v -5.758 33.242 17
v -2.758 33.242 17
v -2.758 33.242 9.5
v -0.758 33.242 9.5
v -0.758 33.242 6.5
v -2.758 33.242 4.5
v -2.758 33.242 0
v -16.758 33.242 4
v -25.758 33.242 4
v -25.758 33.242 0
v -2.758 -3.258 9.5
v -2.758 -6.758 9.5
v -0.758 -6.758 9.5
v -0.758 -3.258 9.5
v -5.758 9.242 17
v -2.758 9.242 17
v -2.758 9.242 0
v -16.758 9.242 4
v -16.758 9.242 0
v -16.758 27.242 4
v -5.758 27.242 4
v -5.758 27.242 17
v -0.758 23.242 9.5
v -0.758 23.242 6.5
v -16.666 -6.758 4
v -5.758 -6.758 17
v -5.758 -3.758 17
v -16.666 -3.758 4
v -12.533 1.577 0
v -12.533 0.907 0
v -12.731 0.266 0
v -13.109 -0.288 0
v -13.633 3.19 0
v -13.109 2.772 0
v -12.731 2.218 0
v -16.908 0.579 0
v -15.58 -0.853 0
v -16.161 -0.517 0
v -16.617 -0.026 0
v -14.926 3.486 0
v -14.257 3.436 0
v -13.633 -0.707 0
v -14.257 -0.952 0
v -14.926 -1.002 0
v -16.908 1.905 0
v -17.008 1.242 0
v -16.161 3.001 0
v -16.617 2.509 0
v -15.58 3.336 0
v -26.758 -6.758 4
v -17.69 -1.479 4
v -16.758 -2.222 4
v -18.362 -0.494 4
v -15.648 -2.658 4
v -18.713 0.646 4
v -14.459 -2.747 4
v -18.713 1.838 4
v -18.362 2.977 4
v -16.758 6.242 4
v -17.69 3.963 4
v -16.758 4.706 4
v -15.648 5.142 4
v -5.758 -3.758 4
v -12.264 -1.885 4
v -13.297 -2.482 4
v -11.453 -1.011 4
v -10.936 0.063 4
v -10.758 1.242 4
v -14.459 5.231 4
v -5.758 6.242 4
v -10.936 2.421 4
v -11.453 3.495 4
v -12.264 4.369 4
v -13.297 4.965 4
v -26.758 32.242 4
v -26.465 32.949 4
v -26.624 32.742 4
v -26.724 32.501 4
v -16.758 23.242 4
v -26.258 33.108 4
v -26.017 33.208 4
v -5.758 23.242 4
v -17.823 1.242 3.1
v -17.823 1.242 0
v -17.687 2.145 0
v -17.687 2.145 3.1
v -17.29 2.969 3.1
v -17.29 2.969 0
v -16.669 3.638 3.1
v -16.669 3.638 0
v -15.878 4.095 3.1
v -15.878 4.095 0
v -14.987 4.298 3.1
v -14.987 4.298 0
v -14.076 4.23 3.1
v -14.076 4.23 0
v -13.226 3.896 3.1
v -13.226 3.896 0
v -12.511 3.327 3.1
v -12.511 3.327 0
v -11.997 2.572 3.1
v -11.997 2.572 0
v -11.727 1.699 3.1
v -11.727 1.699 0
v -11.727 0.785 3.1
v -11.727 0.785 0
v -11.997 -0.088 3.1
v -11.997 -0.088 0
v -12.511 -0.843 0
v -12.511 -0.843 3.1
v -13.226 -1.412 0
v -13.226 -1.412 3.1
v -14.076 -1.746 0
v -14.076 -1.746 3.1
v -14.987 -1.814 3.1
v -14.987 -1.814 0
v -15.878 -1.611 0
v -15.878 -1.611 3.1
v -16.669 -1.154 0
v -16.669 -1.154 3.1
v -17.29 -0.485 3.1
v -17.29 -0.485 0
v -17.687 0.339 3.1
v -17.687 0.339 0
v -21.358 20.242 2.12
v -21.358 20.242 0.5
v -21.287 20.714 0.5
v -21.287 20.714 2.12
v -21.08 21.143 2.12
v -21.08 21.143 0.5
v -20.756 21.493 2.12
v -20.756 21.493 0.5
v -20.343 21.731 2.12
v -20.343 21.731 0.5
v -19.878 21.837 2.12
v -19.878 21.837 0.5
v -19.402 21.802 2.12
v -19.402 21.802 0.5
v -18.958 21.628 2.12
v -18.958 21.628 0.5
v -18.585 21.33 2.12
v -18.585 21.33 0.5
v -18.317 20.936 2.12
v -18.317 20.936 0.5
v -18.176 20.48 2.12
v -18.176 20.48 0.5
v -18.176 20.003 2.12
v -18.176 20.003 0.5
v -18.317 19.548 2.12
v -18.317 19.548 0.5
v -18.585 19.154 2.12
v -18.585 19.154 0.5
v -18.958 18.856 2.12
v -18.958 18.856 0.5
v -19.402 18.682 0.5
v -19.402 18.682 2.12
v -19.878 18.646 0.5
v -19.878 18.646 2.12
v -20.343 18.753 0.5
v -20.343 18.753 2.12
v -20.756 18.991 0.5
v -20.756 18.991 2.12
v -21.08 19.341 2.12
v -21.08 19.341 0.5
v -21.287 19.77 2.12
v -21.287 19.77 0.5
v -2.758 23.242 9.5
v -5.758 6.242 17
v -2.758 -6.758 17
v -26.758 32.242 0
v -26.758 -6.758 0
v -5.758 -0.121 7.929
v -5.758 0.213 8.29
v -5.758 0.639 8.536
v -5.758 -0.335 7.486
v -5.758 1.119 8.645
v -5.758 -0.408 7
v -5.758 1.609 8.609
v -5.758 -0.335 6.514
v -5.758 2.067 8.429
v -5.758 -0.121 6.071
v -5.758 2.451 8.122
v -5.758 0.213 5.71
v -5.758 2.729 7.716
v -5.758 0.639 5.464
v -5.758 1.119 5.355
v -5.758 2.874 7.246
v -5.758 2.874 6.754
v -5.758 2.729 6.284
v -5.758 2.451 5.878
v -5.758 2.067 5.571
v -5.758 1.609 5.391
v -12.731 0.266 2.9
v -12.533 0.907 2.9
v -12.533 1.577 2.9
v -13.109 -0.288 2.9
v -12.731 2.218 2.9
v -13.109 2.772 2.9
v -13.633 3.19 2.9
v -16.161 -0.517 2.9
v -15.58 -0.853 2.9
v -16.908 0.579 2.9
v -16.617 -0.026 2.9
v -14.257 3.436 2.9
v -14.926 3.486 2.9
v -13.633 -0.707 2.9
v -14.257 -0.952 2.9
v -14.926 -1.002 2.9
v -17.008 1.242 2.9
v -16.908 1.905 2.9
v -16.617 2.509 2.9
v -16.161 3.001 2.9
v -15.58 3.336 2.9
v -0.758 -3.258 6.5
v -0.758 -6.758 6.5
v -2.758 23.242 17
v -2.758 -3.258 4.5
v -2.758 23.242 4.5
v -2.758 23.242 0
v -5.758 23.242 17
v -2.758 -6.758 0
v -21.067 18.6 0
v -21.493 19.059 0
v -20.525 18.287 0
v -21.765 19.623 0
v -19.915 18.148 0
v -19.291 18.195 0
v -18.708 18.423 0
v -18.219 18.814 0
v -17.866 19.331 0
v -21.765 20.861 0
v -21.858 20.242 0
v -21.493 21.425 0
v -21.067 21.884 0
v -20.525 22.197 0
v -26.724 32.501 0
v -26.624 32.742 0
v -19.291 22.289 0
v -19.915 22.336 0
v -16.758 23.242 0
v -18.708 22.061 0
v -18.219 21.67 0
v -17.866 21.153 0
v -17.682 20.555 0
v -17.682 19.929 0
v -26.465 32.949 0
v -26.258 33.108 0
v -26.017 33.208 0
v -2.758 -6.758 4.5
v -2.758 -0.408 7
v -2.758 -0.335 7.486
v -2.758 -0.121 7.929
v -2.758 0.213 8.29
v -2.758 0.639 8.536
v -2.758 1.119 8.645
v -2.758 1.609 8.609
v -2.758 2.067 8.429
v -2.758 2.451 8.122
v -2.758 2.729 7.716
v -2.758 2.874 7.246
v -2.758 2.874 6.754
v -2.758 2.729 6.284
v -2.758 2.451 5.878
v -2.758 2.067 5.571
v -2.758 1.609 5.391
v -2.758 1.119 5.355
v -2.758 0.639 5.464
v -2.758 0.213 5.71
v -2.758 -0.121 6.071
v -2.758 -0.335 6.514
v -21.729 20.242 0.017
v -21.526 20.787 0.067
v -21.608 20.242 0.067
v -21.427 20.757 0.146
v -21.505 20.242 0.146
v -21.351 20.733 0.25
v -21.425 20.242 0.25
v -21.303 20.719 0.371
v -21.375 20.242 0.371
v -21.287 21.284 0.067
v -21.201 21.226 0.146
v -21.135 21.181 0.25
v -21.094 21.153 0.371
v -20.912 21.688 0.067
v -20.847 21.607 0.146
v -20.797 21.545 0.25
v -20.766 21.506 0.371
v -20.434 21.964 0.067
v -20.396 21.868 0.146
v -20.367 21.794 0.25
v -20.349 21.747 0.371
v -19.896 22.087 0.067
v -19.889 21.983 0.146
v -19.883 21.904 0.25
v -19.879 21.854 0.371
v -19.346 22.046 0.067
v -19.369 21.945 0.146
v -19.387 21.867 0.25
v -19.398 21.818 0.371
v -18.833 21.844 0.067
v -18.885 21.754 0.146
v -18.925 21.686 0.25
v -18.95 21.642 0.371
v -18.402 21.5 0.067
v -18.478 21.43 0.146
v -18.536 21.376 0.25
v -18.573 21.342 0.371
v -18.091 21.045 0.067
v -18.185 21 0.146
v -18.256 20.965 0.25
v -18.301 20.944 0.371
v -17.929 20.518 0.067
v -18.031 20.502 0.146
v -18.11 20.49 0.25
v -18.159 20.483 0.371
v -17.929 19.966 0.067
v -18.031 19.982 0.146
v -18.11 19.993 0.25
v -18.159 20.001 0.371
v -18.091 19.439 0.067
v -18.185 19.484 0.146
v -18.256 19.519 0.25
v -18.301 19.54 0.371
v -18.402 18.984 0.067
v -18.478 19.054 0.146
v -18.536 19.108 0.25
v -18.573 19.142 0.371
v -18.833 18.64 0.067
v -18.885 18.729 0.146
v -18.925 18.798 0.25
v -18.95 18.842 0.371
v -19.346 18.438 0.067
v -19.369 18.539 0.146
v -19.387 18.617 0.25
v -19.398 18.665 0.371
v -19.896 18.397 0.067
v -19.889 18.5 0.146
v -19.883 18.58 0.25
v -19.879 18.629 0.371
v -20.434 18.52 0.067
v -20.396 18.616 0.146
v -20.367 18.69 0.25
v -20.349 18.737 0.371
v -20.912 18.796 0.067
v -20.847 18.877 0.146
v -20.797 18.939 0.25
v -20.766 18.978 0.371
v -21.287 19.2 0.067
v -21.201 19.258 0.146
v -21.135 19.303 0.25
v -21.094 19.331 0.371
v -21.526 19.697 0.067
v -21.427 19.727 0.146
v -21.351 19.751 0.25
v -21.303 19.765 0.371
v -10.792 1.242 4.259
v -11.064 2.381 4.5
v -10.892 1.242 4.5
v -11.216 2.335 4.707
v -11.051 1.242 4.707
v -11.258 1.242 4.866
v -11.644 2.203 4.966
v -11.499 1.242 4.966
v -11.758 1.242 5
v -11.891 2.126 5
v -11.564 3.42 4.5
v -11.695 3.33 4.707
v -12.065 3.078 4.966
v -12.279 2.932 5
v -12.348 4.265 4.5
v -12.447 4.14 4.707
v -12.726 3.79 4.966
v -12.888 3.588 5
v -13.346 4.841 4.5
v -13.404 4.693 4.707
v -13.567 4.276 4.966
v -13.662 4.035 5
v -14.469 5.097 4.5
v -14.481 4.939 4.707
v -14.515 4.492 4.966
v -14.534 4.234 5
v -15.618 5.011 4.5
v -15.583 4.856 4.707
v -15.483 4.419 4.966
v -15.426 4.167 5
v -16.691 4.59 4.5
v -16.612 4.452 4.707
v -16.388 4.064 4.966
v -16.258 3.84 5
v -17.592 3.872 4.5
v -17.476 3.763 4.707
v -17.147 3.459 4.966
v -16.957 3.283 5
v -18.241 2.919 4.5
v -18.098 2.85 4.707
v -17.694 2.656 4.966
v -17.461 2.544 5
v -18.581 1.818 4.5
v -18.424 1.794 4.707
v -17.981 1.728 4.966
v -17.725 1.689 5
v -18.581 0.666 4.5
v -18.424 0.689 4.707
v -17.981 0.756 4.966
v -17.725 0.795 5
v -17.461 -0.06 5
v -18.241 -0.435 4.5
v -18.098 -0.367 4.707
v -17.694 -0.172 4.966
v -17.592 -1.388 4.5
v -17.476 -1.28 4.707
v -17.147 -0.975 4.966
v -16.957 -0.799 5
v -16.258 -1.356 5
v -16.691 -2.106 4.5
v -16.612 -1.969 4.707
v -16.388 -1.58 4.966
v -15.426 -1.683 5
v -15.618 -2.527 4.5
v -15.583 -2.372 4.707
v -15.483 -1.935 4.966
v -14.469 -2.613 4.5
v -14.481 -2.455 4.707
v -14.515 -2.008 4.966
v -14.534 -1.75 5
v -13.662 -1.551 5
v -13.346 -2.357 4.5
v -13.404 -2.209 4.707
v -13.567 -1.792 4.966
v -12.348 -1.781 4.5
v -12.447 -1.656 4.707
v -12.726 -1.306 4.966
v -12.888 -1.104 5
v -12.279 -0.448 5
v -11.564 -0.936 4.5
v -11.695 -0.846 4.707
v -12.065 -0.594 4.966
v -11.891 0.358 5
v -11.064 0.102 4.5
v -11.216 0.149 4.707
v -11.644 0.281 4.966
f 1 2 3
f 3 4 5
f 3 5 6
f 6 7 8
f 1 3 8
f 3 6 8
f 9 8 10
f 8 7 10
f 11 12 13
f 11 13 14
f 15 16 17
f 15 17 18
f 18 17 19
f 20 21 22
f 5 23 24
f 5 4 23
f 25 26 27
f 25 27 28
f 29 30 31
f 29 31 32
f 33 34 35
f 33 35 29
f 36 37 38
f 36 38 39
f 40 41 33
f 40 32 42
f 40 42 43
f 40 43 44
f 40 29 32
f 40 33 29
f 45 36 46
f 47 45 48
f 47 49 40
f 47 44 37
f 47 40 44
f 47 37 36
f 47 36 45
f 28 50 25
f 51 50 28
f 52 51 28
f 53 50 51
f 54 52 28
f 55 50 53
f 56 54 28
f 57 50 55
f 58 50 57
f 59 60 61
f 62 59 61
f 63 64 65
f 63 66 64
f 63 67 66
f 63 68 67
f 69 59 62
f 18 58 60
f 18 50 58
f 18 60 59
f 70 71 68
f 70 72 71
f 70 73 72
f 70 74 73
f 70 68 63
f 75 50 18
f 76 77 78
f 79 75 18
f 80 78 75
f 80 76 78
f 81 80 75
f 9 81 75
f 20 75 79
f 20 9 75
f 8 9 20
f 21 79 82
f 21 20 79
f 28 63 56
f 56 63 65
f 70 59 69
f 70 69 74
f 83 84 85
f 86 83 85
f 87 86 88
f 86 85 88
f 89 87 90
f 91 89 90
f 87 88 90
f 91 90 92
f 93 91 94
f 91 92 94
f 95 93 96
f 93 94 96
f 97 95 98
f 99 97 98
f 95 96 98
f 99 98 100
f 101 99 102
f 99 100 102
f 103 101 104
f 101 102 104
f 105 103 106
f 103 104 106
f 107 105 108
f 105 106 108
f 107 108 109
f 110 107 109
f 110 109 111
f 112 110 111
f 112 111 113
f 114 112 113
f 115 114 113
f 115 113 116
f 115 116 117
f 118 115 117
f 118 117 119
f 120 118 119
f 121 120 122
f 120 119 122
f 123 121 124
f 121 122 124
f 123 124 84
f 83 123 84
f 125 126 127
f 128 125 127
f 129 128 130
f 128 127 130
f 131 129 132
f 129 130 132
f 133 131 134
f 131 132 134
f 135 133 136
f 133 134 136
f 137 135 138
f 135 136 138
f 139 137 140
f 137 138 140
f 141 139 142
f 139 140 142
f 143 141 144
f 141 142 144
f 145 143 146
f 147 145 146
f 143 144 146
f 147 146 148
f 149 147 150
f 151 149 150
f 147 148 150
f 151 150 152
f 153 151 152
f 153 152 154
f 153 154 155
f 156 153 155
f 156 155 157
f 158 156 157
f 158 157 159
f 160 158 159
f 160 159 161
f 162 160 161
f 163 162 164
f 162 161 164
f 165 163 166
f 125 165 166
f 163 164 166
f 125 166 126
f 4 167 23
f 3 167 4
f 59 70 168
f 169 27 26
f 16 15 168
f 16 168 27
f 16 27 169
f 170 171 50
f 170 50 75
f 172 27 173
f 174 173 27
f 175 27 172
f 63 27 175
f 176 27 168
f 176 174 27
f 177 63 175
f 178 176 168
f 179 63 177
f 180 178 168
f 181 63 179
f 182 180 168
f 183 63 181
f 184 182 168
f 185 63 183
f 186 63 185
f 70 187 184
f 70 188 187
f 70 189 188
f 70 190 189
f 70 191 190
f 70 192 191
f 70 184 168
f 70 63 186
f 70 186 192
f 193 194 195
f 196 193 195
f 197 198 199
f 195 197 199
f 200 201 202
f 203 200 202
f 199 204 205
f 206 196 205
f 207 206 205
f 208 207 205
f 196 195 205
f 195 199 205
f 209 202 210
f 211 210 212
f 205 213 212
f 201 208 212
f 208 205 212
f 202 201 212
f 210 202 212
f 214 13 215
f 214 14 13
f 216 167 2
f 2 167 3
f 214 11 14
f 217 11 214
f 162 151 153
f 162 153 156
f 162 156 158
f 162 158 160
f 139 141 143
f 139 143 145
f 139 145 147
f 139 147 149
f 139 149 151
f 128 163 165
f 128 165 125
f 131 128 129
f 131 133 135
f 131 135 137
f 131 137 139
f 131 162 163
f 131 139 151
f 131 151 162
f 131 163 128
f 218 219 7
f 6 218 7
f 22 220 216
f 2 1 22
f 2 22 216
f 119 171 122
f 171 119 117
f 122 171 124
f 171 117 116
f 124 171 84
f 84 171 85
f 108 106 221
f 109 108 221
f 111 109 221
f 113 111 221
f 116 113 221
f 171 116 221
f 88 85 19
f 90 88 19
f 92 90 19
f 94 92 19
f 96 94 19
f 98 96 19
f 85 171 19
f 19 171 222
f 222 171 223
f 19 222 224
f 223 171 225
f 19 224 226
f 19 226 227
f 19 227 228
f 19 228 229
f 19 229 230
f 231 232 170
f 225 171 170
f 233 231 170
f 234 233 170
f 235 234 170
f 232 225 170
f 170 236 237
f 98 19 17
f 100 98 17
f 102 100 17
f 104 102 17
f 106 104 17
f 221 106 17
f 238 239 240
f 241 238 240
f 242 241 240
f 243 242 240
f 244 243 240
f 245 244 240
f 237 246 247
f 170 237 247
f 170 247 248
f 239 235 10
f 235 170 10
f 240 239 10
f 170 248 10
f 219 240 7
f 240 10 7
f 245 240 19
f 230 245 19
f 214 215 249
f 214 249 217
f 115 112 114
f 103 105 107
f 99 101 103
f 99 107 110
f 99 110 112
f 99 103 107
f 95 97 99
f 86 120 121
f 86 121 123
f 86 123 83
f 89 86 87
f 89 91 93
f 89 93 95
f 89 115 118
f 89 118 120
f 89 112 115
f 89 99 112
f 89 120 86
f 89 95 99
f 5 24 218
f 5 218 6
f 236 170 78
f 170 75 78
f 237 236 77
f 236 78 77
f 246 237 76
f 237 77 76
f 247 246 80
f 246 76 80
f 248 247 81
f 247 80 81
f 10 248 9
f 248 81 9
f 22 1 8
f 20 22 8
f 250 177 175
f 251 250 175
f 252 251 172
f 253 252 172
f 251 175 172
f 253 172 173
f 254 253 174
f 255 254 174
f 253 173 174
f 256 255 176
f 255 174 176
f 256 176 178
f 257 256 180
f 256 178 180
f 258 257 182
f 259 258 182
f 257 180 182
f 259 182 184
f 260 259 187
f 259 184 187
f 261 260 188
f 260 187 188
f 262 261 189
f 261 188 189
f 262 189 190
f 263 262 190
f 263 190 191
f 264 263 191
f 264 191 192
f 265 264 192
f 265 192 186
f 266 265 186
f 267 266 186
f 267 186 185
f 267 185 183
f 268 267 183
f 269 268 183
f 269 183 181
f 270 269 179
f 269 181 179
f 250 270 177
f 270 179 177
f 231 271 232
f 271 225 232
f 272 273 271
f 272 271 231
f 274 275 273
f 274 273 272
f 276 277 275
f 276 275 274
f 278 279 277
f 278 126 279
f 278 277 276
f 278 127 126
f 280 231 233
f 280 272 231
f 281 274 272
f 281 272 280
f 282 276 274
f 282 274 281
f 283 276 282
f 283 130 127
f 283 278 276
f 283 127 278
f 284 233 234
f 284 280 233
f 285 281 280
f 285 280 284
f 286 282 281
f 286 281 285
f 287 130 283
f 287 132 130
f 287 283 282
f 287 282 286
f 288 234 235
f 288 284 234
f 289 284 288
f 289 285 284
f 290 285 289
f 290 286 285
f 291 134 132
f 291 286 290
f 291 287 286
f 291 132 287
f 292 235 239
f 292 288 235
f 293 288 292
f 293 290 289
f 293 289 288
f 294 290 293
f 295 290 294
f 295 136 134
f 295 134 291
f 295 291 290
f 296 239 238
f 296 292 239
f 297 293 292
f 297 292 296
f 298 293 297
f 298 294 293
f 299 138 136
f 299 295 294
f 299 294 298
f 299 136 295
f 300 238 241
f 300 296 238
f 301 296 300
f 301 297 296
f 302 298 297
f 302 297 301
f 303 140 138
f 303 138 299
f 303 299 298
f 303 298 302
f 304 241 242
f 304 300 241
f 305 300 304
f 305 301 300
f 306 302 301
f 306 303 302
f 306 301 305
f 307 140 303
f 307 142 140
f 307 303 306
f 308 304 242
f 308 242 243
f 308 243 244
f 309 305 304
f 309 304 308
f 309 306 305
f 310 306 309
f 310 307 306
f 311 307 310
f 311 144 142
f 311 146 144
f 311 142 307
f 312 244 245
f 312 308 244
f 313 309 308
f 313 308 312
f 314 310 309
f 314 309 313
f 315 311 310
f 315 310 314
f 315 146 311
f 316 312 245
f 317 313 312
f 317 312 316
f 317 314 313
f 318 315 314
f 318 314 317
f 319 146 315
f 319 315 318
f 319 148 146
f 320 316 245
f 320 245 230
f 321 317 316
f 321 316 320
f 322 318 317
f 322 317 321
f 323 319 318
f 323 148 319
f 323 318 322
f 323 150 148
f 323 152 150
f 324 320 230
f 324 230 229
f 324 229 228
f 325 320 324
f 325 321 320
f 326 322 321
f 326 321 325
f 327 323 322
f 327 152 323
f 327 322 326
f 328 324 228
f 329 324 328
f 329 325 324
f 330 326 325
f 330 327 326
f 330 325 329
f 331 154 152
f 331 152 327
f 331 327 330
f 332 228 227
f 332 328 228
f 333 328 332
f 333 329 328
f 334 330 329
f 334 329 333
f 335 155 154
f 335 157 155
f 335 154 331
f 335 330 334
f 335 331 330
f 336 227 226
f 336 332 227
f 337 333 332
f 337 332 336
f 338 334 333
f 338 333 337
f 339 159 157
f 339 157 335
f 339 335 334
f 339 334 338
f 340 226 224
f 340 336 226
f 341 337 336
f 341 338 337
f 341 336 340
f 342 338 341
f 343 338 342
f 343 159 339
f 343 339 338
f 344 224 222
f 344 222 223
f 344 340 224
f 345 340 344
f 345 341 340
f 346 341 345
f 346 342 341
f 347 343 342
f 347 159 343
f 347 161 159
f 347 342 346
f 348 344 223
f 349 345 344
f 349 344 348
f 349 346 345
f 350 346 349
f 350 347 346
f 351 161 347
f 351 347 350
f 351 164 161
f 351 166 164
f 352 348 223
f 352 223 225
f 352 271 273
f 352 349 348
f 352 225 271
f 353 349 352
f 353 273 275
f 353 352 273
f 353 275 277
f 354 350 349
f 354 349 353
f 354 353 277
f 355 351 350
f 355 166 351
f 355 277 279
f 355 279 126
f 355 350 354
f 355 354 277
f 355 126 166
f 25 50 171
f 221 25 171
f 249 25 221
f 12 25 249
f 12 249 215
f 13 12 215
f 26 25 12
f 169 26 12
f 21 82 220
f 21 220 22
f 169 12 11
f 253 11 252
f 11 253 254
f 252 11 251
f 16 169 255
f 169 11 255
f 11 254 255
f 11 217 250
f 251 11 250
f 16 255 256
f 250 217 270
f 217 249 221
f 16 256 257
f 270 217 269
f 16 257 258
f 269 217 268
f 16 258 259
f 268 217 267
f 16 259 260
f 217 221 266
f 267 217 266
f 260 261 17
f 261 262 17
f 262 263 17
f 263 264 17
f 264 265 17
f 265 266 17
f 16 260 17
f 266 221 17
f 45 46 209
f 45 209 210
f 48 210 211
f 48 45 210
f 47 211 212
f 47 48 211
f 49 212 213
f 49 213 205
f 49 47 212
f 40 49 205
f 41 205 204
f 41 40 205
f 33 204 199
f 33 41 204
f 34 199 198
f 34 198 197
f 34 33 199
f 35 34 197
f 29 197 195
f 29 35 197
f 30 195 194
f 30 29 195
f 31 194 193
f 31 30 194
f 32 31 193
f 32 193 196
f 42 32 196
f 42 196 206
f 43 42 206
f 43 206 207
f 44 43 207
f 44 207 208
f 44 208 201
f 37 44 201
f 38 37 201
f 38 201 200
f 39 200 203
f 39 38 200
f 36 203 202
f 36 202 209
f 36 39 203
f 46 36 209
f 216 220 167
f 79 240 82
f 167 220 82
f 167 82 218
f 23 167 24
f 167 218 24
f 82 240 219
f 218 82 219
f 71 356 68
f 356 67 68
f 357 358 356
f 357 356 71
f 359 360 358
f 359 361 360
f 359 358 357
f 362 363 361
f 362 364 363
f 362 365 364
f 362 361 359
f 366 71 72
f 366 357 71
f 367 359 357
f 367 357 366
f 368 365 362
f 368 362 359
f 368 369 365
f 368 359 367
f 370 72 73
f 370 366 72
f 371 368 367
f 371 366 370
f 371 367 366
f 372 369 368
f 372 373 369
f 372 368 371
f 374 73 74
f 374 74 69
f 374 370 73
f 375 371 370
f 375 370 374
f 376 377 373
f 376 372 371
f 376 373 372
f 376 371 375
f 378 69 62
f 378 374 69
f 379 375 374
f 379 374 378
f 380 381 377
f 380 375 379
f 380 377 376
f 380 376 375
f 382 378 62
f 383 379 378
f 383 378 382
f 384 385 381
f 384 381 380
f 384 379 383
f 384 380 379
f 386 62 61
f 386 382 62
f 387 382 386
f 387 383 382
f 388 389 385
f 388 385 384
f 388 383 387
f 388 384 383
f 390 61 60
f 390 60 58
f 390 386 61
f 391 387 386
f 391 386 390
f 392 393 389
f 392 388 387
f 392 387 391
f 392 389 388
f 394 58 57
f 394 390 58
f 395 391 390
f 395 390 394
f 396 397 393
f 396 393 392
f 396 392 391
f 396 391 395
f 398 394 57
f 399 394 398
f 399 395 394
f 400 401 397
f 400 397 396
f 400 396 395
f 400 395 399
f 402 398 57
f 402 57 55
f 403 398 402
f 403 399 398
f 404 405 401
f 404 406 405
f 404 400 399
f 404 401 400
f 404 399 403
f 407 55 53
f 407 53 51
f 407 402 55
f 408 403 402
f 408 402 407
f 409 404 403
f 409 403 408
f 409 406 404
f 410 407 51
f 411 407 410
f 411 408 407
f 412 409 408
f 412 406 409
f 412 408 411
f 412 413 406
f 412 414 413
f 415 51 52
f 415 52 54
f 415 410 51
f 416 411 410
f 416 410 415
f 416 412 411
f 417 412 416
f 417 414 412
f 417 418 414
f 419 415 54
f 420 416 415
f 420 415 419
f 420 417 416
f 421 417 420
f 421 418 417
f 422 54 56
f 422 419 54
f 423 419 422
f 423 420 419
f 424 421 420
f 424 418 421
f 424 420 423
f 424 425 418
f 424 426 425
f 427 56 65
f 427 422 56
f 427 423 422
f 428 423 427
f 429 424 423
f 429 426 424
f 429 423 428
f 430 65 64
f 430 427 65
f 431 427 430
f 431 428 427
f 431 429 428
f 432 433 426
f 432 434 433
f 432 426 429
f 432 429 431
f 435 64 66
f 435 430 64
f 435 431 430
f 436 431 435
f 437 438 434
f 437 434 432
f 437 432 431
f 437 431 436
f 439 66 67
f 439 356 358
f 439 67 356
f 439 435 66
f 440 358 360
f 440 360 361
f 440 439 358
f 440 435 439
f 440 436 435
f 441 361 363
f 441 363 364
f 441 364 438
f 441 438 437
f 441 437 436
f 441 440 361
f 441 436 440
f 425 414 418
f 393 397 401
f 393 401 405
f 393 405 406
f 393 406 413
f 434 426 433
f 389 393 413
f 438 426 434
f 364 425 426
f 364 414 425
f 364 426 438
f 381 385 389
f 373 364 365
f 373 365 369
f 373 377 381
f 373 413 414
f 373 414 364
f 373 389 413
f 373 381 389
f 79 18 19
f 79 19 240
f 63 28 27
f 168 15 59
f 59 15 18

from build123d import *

# Parameters (mm, degrees)
SKETCH1_W               = 24
SKETCH1_H               = 40
BOSS_EXTRUDE1_DEPTH     = 4
FILLET1_R               = 1
CUT_EXTRUDE2_DEPTH      = 43.860474698
CUT_EXTRUDE2_DEPTH_BACK = 43.860474698
SKETCH3_W               = 14
SKETCH3_H               = 14
SKETCH5_W               = 3
SKETCH5_H               = 16
BOSS_EXTRUDE2_DEPTH     = 13
BOSS_EXTRUDE3_DEPTH     = 3
BOSS_EXTRUDE4_DEPTH     = 3
SKETCH8_R               = 1.65
CUT_EXTRUDE4_DEPTH      = 3
SKETCH9_W               = 3
SKETCH9_H               = 10
BOSS_EXTRUDE5_DEPTH     = 13
BOSS_EXTRUDE6_DEPTH     = 6
SKETCH11_W              = 5
SKETCH11_H              = 10
BOSS_EXTRUDE7_DEPTH     = 2
CHAMFER1_SIZE           = 2
SKETCH12_R              = 3.065
CUT_EXTRUDE5_DEPTH      = 3.1
SKETCH15_R              = 1.6
CUT_EXTRUDE6_DEPTH      = 2.12
SKETCH17_R              = 4
BOSS_EXTRUDE8_DEPTH     = 1
FILLET3_R               = 1
SKETCH21_R              = 2.25
BOSS_EXTRUDE11_DEPTH    = 2.9
SKETCH23_W              = 5
SKETCH23_H              = 3.5
BOSS_EXTRUDE12_DEPTH    = 2
CHAMFER2_SIZE           = 2
FILLET5_R               = 0.5


with BuildPart() as part:
    # Sketch1 → Boss-Extrude1 (new body)
    with BuildSketch(Plane.XY):
        with Locations((-14.758064516, 13.241935484)):
            Rectangle(SKETCH1_W, SKETCH1_H)
    extrude(amount=BOSS_EXTRUDE1_DEPTH)

    # Fillet1
    fillet1_edges = [part.edges().sort_by_distance(p)[0] for p in [
        (-26.758064516, 33.241935484, 2),
    ]]
    fillet(fillet1_edges, radius=FILLET1_R)

    # Sketch3 → Cut-Extrude2 (cut, two sides: drawn at the far end of the back side and taken through both)
    with BuildSketch(Plane(origin=(0, 0, 0), x_dir=(-1, 0, 0), z_dir=(0, 0, -1)).offset(-CUT_EXTRUDE2_DEPTH_BACK)):
        with Locations((9.758064516, 16.241935484)):
            Rectangle(SKETCH3_W, SKETCH3_H)
    extrude(amount=CUT_EXTRUDE2_DEPTH + CUT_EXTRUDE2_DEPTH_BACK, mode=Mode.SUBTRACT)

    # Sketch5 → Boss-Extrude2 (add)
    with BuildSketch(Plane.XY.offset(4)):
        with Locations((-4.258064516, 1.241935484)):
            Rectangle(SKETCH5_W, SKETCH5_H)
    extrude(amount=BOSS_EXTRUDE2_DEPTH)

    # Sketch6 → Boss-Extrude3 (add)
    with BuildSketch(Plane.XZ.offset(6.758064516)):
        Polygon((-5.758064516, 17), (-16.666359721, 4), (-5.758064516, 4), align=None)
    extrude(amount=-BOSS_EXTRUDE3_DEPTH)

    # Sketch7 → Boss-Extrude4 (add)
    with BuildSketch(Plane(origin=(0, 9.241935484, 0), x_dir=(1, 0, 0), z_dir=(0, 1, 0))):
        Polygon((-5.758064516, -17), (-16.758064516, -4), (-5.758064516, -4), align=None)
    extrude(amount=-BOSS_EXTRUDE4_DEPTH)

    # Sketch8 → Cut-Extrude4 (cut)
    with BuildSketch(Plane.ZY.offset(5.758064516)):
        with Locations(Location((7, 1.241935484, 0), (0, 0, 270))):
            Circle(SKETCH8_R)
    extrude(amount=-CUT_EXTRUDE4_DEPTH, mode=Mode.SUBTRACT)

    # Sketch9 → Boss-Extrude5 (add)
    with BuildSketch(Plane.XY.offset(4)):
        with Locations((-4.258064516, 28.241935484)):
            Rectangle(SKETCH9_W, SKETCH9_H)
    extrude(amount=BOSS_EXTRUDE5_DEPTH)

    # Sketch10 → Boss-Extrude6 (add)
    with BuildSketch(Plane(origin=(0, 33.241935484, 0), x_dir=(1, 0, 0), z_dir=(0, 1, 0))):
        Polygon((-5.758064516, -17), (-16.758064516, -4), (-5.758064516, -4), align=None)
    extrude(amount=-BOSS_EXTRUDE6_DEPTH)

    # Sketch11 → Boss-Extrude7 (add)
    with BuildSketch(Plane(origin=(-2.758064516, 0, 0), x_dir=(0, 0, -1), z_dir=(1, 0, 0))):
        with Locations((-7, 28.241935484)):
            Rectangle(SKETCH11_W, SKETCH11_H)
    extrude(amount=BOSS_EXTRUDE7_DEPTH)

    # Chamfer1
    chamfer1_edges = [part.edges().sort_by_distance(p)[0] for p in [
        (-0.758064516, 28.241935484, 4.5),
    ]]
    chamfer(chamfer1_edges, length=CHAMFER1_SIZE - 0.0001)  # a hair under: the kernel refuses the full size

    # Sketch12 → Cut-Extrude5 (cut)
    with BuildSketch(Plane(origin=(0, 0, 0), x_dir=(-1, 0, 0), z_dir=(0, 0, -1))):
        with Locations((14.758064516, 1.241935484)):
            Circle(SKETCH12_R)
    extrude(amount=-CUT_EXTRUDE5_DEPTH, mode=Mode.SUBTRACT)

    # Sketch15 → Cut-Extrude6 (cut)
    with BuildSketch(Plane(origin=(0, 0, 0), x_dir=(-1, 0, 0), z_dir=(0, 0, -1))):
        with Locations((19.758064516, 20.241935484)):
            Circle(SKETCH15_R)
    extrude(amount=-CUT_EXTRUDE6_DEPTH, mode=Mode.SUBTRACT)

    # Sketch17 → Boss-Extrude8 (add)
    with BuildSketch(Plane.XY.offset(4)):
        with Locations((-14.758064516, 1.241935484)):
            Circle(SKETCH17_R)
    extrude(amount=BOSS_EXTRUDE8_DEPTH)

    # Fillet3
    fillet3_edges = [part.edges().sort_by_distance(p)[0] for p in [
        (-18.758064516, 1.241935484, 5),
    ]]
    fillet(fillet3_edges, radius=FILLET3_R - 0.0001)  # a hair under: the kernel refuses the full size

    # Sketch23 → Boss-Extrude12 (add)
    with BuildSketch(Plane(origin=(-2.758064516, 0, 0), x_dir=(0, 0, -1), z_dir=(1, 0, 0))):
        with Locations((-7, -5.008064516)):
            Rectangle(SKETCH23_W, SKETCH23_H)
    extrude(amount=BOSS_EXTRUDE12_DEPTH)

    # Chamfer2
    chamfer2_edges = [part.edges().sort_by_distance(p)[0] for p in [
        (-0.758064516, -5.008064516, 4.5),
    ]]
    chamfer(chamfer2_edges, length=CHAMFER2_SIZE - 0.0001)  # a hair under: the kernel refuses the full size

    # Fillet5
    fillet5_edges = [part.edges().sort_by_distance(p)[0] for p in [
        (-18.158064516, 20.241935484, 0),
    ]]
    fillet(fillet5_edges, radius=FILLET5_R)


with BuildPart() as body_2:
    # Sketch21 → Boss-Extrude11 (new body)
    with BuildSketch(Plane(origin=(0, 0, 0), x_dir=(-1, 0, 0), z_dir=(0, 0, -1))):
        with Locations((14.758064516, 1.241935484)):
            Circle(SKETCH21_R)
    extrude(amount=-BOSS_EXTRUDE11_DEPTH)


solid = Compound([part.part, body_2.part])
